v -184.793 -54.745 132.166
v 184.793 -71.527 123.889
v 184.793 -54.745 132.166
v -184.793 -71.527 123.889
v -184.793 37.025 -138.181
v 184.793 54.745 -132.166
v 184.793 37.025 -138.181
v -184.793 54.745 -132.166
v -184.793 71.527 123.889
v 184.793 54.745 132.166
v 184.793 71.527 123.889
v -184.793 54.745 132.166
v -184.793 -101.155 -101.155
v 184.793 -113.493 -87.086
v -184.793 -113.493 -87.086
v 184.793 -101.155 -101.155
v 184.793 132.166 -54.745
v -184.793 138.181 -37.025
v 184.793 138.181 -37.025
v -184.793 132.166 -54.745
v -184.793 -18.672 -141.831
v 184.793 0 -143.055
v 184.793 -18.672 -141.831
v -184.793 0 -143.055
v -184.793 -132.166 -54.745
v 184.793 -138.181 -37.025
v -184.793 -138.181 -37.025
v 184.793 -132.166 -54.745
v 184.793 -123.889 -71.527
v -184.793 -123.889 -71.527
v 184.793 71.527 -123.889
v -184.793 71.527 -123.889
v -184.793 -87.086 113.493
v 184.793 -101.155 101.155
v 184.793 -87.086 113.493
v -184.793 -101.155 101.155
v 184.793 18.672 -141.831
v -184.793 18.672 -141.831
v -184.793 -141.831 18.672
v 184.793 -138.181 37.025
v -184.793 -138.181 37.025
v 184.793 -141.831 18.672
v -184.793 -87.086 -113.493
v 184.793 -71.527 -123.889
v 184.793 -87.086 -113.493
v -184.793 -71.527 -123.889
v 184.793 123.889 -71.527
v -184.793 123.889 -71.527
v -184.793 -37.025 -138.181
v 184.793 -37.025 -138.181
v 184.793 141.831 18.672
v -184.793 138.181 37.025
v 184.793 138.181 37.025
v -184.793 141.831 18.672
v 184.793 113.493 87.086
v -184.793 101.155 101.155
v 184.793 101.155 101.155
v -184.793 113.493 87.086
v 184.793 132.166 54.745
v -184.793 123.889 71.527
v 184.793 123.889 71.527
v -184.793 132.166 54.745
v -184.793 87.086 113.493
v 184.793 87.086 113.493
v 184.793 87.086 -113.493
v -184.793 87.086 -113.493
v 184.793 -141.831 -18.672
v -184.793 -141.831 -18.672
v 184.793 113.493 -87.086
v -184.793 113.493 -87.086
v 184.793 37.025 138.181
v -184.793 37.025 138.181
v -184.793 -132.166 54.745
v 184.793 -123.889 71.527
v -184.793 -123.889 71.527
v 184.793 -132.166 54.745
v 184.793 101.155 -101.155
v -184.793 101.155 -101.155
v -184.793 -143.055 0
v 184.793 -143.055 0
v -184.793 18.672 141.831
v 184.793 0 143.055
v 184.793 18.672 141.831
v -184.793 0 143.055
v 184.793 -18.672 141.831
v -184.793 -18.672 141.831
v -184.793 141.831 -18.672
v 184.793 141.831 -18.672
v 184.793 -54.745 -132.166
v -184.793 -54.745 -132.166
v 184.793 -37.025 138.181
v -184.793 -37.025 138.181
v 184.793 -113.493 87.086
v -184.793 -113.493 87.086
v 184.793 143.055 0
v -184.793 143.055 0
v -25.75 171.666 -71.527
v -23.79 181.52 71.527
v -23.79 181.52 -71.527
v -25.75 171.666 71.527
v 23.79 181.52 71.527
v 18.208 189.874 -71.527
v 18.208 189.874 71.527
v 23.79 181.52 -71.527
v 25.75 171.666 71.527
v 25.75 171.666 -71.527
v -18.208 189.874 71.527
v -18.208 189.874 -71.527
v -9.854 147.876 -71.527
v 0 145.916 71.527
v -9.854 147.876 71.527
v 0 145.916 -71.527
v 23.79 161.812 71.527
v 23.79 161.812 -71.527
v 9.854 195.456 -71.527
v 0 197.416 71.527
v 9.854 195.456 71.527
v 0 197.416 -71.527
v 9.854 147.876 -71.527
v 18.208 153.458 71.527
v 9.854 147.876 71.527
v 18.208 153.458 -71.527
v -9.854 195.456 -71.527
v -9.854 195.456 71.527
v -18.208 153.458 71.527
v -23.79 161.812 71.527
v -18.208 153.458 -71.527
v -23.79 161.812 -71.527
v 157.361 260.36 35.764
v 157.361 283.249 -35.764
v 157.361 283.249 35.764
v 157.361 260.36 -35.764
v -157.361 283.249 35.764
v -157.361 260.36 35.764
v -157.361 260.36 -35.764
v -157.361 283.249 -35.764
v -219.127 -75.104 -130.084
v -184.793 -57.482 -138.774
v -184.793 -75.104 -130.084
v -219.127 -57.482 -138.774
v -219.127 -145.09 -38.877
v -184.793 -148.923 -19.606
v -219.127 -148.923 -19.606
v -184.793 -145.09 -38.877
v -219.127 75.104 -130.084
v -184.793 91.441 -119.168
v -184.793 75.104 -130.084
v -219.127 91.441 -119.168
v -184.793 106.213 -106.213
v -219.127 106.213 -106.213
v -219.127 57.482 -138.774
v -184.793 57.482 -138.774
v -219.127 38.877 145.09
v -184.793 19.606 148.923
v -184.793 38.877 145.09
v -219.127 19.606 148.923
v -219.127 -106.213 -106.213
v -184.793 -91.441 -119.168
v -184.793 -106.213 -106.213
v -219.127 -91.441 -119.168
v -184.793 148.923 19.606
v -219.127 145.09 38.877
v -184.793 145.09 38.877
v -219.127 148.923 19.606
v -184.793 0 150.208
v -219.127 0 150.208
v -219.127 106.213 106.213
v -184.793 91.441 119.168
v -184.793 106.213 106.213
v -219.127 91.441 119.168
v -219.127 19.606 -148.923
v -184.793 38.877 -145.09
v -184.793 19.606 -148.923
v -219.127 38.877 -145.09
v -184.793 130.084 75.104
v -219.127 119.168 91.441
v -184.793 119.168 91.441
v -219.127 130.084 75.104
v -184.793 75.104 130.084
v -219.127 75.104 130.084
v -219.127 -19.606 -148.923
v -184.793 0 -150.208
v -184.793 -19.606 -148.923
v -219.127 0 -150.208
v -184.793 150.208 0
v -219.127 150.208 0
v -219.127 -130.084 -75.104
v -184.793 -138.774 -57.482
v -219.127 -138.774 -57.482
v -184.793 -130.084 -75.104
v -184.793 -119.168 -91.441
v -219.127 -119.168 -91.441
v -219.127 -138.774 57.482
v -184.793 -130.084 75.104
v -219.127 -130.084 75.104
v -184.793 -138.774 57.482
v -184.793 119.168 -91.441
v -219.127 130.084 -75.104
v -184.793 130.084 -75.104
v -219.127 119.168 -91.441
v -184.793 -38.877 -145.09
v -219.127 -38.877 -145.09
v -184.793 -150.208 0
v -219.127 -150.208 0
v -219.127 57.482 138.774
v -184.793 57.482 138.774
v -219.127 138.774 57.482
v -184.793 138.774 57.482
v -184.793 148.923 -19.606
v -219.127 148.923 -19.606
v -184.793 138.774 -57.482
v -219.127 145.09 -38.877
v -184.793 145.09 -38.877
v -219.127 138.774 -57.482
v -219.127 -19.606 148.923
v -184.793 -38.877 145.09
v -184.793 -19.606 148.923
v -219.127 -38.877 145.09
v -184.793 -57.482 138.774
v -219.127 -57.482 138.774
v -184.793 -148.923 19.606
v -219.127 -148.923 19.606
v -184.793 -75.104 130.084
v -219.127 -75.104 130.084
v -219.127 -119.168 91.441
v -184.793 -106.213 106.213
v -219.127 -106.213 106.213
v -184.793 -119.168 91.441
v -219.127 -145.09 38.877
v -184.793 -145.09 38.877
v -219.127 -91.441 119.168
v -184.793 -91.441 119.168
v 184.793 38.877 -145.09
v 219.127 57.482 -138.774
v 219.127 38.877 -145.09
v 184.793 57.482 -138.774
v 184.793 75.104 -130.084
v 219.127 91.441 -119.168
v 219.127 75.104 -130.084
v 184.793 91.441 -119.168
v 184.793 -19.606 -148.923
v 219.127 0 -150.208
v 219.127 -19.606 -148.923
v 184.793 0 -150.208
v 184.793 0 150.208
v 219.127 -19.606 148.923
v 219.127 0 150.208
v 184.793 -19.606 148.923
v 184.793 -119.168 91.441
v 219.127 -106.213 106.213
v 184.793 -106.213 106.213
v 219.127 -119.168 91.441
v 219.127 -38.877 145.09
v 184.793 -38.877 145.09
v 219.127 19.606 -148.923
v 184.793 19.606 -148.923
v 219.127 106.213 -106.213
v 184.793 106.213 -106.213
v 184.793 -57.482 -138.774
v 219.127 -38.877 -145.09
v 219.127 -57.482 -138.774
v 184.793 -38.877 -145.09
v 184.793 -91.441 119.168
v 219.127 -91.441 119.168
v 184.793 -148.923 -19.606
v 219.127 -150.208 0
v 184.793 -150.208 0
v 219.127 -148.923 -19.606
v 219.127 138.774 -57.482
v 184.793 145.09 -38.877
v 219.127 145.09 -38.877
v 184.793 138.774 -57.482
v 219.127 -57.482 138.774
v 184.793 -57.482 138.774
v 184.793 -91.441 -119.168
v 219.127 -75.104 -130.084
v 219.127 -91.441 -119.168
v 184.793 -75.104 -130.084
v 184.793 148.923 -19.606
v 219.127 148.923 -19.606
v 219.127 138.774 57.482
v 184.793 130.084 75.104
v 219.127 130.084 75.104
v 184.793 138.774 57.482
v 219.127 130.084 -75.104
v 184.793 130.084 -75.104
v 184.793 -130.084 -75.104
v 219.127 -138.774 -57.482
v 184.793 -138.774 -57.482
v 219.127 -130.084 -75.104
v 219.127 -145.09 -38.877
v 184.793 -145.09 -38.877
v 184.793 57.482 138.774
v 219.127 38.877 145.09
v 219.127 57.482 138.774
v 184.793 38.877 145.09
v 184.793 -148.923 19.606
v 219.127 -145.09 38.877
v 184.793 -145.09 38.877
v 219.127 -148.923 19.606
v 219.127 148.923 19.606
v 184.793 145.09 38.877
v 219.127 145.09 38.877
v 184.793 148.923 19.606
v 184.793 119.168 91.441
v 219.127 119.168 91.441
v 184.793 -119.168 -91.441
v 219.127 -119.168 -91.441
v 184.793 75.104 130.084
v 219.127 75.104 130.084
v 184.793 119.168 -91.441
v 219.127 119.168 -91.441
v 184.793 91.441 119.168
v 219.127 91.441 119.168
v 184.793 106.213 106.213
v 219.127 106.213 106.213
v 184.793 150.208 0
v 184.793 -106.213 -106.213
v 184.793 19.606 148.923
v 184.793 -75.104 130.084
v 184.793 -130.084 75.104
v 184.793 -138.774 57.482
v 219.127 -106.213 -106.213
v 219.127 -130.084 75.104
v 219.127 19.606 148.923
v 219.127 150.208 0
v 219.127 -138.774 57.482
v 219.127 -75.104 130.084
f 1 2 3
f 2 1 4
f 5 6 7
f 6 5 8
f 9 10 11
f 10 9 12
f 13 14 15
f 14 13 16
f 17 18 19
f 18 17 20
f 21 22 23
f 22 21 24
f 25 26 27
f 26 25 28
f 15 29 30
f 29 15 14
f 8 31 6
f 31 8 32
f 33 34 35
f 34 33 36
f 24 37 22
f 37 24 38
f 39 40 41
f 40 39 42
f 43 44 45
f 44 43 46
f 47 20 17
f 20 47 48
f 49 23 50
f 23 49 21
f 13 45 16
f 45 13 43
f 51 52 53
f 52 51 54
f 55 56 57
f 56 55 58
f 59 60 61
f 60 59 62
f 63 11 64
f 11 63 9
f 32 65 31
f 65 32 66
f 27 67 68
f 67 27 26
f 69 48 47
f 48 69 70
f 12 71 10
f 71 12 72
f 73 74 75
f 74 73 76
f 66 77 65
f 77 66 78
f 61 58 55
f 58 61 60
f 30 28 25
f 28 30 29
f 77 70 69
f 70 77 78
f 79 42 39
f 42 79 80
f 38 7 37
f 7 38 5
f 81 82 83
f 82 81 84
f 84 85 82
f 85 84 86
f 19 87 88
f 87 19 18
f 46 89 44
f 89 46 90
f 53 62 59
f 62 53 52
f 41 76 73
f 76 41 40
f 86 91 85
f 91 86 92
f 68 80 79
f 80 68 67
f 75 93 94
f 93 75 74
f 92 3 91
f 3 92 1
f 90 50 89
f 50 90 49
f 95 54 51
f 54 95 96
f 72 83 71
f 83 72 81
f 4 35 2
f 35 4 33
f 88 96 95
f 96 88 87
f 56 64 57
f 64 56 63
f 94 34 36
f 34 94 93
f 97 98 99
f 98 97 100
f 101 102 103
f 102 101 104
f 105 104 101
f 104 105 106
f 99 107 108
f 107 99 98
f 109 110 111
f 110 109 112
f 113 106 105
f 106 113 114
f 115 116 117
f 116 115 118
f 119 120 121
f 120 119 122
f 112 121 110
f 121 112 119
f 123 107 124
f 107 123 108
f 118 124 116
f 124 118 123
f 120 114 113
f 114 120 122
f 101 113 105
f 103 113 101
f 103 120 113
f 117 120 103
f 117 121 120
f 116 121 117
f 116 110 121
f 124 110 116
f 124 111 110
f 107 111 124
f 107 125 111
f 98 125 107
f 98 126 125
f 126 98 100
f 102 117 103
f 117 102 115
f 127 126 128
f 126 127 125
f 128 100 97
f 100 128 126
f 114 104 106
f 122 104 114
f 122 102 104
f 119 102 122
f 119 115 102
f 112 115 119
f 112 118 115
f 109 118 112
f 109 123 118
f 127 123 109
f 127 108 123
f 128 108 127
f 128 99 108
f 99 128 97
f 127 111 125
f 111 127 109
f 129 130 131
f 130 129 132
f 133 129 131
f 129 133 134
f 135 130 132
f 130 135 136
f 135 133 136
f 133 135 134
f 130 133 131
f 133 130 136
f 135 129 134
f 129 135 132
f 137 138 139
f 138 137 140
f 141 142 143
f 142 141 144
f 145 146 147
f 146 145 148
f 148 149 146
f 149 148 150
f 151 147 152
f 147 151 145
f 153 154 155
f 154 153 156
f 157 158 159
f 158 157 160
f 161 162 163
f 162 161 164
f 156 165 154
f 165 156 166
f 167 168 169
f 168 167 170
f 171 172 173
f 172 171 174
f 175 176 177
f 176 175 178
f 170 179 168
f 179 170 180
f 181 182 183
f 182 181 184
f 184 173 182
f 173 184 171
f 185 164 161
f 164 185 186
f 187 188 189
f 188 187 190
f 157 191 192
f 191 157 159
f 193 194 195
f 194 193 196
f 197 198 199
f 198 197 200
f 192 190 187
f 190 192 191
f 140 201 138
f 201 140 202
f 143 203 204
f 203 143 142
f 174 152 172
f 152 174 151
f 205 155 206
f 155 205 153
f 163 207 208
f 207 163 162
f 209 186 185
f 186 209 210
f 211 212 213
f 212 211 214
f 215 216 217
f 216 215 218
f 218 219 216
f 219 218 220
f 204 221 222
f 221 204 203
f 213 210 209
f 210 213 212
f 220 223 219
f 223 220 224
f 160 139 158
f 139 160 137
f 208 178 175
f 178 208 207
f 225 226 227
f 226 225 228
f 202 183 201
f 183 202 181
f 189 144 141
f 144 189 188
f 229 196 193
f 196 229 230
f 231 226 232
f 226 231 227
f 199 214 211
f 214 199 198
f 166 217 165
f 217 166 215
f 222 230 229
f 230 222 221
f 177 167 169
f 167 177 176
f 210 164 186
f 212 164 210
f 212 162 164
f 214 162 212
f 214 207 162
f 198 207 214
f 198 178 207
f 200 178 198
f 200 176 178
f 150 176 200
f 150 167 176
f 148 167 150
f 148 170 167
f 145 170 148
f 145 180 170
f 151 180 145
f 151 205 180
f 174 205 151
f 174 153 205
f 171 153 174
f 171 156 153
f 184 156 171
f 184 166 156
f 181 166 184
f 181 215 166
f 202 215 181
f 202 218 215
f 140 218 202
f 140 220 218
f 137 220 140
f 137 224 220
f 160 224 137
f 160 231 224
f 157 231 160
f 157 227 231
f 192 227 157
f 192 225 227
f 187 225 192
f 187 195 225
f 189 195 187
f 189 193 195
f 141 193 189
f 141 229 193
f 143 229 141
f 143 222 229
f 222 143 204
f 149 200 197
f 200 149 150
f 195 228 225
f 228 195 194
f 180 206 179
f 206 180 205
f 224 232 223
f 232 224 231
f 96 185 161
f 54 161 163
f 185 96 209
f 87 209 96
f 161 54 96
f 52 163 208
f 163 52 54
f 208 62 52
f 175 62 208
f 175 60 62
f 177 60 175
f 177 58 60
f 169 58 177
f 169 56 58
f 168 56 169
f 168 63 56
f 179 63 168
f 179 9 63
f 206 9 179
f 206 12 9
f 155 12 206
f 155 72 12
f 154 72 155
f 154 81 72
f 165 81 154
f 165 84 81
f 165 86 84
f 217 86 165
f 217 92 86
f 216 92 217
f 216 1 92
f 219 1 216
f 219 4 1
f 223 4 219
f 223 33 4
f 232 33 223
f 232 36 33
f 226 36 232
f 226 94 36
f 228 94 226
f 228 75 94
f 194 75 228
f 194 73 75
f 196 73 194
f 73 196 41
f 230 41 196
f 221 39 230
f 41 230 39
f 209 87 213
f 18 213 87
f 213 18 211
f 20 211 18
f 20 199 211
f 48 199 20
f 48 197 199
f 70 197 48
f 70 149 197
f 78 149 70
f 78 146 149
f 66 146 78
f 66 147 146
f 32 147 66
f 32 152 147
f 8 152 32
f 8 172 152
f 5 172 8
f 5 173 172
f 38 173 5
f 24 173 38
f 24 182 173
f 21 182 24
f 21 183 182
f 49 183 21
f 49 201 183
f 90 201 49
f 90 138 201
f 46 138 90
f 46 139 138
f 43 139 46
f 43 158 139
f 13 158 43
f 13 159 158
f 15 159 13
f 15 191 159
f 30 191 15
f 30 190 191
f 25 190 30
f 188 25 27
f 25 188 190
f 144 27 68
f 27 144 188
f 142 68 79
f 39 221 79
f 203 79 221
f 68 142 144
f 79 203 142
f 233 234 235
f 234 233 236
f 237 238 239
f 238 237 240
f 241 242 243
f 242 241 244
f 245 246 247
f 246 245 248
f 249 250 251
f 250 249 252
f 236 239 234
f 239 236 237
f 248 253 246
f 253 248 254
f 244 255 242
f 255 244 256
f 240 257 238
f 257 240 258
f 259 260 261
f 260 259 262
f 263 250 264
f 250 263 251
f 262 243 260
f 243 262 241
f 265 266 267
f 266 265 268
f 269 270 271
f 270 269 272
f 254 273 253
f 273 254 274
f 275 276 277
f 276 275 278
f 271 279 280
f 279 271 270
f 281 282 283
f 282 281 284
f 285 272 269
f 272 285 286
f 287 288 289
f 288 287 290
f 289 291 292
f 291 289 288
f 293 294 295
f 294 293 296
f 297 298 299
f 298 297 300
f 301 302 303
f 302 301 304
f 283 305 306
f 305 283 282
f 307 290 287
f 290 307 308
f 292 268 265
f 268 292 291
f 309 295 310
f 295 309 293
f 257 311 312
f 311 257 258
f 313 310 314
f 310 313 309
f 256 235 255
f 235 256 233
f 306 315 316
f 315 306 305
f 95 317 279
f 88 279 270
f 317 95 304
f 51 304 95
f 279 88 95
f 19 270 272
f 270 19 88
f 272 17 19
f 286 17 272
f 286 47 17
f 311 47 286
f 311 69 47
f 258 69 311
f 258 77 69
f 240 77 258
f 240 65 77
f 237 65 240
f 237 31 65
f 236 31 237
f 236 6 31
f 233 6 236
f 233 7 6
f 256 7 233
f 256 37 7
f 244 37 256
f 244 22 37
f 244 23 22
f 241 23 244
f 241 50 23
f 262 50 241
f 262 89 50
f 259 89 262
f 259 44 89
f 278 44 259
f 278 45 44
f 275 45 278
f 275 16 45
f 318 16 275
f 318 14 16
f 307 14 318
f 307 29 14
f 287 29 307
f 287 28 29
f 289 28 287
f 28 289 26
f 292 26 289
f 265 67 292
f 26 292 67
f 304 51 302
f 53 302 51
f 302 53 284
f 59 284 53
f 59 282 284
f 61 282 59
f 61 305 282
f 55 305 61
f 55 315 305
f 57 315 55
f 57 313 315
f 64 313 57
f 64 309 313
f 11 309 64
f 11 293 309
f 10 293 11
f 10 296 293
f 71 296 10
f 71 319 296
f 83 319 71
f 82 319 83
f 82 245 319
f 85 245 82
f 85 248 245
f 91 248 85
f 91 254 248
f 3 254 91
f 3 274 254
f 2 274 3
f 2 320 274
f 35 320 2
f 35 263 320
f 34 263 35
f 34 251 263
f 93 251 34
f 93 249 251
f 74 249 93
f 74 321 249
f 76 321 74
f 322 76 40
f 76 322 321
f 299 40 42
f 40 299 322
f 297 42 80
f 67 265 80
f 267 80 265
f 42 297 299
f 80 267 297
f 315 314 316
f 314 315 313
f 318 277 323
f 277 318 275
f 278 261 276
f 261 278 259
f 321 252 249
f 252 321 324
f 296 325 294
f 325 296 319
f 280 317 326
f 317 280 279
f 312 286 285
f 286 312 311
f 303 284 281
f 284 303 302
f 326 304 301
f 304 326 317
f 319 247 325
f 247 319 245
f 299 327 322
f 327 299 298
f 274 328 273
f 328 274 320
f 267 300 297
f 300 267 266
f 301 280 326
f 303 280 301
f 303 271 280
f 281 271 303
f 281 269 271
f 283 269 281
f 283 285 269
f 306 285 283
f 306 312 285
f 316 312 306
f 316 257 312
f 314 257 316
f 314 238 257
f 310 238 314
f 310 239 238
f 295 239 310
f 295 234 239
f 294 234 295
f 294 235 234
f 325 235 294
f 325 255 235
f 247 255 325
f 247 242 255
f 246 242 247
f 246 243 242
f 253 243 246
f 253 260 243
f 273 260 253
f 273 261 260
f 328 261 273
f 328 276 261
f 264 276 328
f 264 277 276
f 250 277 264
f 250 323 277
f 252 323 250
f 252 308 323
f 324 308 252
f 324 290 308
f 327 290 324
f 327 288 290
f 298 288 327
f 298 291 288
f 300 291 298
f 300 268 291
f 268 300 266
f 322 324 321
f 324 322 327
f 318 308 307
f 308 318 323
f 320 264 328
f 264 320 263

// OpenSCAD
// Auto-generated by scripts/author_from_manifest.py (Phase D.3).
// Source: data/phase_d_manifest.json (sku_intent='nibco-f619-osy-gate-6in').
// Do not hand-edit — regenerate from the manifest.
//
// @part nibco_f619_osy_gate_6in
// @kind valve
// @category valve.gate
// @display-name "Nibco F-619 OS&Y Gate Valve 6\" Flanged"
// @mfg nibco
// @mfg-pn F-619
// @listing UL FM
// @price-usd 470.00
// @install-minutes 35
// @crew foreman
// @param size_in number default=6 label="Size" unit="in"
// @port inlet position=[-0.05,0,0] direction=[-1,0,0] style=grooved size_in=6 role=run_a
// @port outlet position=[0.05,0,0] direction=[1,0,0] style=grooved size_in=6 role=run_b

size_in = 6.0;

function od_mm(nps) =
    nps ==   1  ? 33.4 :
    nps == 1.25 ? 42.2 :
    nps == 1.5  ? 48.3 :
    nps ==   2  ? 60.3 :
    nps == 2.5  ? 73.0 :
    nps ==   3  ? 88.9 :
    nps ==   4  ? 114.3 :
    nps ==   6  ? 168.3 :
    nps ==   8  ? 219.1 : 73.0;

od = od_mm(size_in);
body_len = od * 2.4;
body_d   = od * 1.7;

union() {
    // Valve body
    rotate([0, 90, 0])
        cylinder(h = body_len, d = body_d, center = true, $fn = 48);
    // Stem / handle indicator
    translate([0, body_d * 0.6, 0])
        cylinder(h = body_d * 0.5, d = body_d * 0.18, center = true, $fn = 16);
    translate([0, body_d * 0.95, 0])
        cube([body_d * 1.1, body_d * 0.08, body_d * 0.25], center = true);
    // End flanges
    translate([-body_len/2, 0, 0])
        rotate([0, 90, 0])
        cylinder(h = body_d * 0.12, d = body_d * 1.05, center = true, $fn = 48);
    translate([ body_len/2, 0, 0])
        rotate([0, 90, 0])
        cylinder(h = body_d * 0.12, d = body_d * 1.05, center = true, $fn = 48);
}
